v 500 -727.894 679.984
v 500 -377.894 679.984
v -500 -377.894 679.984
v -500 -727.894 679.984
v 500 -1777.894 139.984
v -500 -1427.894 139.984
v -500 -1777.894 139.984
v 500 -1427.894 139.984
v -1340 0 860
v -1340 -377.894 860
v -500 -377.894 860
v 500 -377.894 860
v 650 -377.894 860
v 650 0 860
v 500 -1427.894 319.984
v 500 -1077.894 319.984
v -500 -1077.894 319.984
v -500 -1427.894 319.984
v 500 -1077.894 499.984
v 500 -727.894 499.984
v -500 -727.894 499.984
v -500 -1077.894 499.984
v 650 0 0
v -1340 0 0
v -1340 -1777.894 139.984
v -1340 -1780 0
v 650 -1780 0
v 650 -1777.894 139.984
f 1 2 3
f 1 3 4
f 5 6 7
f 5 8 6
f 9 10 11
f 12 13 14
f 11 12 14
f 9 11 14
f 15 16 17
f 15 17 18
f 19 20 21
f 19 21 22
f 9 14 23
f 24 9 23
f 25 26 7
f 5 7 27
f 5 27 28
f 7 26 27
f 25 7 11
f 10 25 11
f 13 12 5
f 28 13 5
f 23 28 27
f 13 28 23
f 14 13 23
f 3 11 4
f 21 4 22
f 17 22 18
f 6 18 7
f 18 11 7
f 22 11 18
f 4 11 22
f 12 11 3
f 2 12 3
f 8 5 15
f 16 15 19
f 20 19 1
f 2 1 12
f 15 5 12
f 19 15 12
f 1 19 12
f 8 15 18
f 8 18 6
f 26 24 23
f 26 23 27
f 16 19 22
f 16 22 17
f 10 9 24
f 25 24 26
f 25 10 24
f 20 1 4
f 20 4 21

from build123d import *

# Parameters (mm, degrees)
F1_DEPTH      = 500
F1_DEPTH_BACK = 500
F3_DEPTH      = 150
F5_DEPTH      = 840


with BuildPart() as f1:
    # F0 (on Right) → F1 (new body, two sides)
    with BuildSketch(Plane.YZ) as f1_sk:
        Polygon((-1780, 0), (0, 0), (0, 860), (-377.893543, 860), (-377.893543, 679.984152), (-727.893543, 679.984152), (-727.893543, 499.984152), (-1077.893543, 499.984152), (-1077.893543, 319.984152), (-1427.893543, 319.984152), (-1427.893543, 139.984152), (-1777.893543, 139.984152), align=None)
    extrude(amount=F1_DEPTH)
    extrude(f1_sk.sketch, amount=-F1_DEPTH_BACK)

    # F2 (on face) → F3 (join)
    with BuildSketch(Plane.YZ.offset(500)):
        Polygon((0, 860), (-377.893543, 860), (-1777.893543, 139.984152), (-1780, 0), (0, 0), align=None)
    extrude(amount=F3_DEPTH)

    # F4 (on face) → F5 (join)
    with BuildSketch(Plane(origin=(-500, 0, 0), x_dir=(0, -1, 0), z_dir=(-1, 0, 0))):
        Polygon((1780, 0), (1777.893543, 139.984152), (377.893543, 860), (0, 860), (0, 0), align=None)
    extrude(amount=F5_DEPTH)


solid = f1.part
